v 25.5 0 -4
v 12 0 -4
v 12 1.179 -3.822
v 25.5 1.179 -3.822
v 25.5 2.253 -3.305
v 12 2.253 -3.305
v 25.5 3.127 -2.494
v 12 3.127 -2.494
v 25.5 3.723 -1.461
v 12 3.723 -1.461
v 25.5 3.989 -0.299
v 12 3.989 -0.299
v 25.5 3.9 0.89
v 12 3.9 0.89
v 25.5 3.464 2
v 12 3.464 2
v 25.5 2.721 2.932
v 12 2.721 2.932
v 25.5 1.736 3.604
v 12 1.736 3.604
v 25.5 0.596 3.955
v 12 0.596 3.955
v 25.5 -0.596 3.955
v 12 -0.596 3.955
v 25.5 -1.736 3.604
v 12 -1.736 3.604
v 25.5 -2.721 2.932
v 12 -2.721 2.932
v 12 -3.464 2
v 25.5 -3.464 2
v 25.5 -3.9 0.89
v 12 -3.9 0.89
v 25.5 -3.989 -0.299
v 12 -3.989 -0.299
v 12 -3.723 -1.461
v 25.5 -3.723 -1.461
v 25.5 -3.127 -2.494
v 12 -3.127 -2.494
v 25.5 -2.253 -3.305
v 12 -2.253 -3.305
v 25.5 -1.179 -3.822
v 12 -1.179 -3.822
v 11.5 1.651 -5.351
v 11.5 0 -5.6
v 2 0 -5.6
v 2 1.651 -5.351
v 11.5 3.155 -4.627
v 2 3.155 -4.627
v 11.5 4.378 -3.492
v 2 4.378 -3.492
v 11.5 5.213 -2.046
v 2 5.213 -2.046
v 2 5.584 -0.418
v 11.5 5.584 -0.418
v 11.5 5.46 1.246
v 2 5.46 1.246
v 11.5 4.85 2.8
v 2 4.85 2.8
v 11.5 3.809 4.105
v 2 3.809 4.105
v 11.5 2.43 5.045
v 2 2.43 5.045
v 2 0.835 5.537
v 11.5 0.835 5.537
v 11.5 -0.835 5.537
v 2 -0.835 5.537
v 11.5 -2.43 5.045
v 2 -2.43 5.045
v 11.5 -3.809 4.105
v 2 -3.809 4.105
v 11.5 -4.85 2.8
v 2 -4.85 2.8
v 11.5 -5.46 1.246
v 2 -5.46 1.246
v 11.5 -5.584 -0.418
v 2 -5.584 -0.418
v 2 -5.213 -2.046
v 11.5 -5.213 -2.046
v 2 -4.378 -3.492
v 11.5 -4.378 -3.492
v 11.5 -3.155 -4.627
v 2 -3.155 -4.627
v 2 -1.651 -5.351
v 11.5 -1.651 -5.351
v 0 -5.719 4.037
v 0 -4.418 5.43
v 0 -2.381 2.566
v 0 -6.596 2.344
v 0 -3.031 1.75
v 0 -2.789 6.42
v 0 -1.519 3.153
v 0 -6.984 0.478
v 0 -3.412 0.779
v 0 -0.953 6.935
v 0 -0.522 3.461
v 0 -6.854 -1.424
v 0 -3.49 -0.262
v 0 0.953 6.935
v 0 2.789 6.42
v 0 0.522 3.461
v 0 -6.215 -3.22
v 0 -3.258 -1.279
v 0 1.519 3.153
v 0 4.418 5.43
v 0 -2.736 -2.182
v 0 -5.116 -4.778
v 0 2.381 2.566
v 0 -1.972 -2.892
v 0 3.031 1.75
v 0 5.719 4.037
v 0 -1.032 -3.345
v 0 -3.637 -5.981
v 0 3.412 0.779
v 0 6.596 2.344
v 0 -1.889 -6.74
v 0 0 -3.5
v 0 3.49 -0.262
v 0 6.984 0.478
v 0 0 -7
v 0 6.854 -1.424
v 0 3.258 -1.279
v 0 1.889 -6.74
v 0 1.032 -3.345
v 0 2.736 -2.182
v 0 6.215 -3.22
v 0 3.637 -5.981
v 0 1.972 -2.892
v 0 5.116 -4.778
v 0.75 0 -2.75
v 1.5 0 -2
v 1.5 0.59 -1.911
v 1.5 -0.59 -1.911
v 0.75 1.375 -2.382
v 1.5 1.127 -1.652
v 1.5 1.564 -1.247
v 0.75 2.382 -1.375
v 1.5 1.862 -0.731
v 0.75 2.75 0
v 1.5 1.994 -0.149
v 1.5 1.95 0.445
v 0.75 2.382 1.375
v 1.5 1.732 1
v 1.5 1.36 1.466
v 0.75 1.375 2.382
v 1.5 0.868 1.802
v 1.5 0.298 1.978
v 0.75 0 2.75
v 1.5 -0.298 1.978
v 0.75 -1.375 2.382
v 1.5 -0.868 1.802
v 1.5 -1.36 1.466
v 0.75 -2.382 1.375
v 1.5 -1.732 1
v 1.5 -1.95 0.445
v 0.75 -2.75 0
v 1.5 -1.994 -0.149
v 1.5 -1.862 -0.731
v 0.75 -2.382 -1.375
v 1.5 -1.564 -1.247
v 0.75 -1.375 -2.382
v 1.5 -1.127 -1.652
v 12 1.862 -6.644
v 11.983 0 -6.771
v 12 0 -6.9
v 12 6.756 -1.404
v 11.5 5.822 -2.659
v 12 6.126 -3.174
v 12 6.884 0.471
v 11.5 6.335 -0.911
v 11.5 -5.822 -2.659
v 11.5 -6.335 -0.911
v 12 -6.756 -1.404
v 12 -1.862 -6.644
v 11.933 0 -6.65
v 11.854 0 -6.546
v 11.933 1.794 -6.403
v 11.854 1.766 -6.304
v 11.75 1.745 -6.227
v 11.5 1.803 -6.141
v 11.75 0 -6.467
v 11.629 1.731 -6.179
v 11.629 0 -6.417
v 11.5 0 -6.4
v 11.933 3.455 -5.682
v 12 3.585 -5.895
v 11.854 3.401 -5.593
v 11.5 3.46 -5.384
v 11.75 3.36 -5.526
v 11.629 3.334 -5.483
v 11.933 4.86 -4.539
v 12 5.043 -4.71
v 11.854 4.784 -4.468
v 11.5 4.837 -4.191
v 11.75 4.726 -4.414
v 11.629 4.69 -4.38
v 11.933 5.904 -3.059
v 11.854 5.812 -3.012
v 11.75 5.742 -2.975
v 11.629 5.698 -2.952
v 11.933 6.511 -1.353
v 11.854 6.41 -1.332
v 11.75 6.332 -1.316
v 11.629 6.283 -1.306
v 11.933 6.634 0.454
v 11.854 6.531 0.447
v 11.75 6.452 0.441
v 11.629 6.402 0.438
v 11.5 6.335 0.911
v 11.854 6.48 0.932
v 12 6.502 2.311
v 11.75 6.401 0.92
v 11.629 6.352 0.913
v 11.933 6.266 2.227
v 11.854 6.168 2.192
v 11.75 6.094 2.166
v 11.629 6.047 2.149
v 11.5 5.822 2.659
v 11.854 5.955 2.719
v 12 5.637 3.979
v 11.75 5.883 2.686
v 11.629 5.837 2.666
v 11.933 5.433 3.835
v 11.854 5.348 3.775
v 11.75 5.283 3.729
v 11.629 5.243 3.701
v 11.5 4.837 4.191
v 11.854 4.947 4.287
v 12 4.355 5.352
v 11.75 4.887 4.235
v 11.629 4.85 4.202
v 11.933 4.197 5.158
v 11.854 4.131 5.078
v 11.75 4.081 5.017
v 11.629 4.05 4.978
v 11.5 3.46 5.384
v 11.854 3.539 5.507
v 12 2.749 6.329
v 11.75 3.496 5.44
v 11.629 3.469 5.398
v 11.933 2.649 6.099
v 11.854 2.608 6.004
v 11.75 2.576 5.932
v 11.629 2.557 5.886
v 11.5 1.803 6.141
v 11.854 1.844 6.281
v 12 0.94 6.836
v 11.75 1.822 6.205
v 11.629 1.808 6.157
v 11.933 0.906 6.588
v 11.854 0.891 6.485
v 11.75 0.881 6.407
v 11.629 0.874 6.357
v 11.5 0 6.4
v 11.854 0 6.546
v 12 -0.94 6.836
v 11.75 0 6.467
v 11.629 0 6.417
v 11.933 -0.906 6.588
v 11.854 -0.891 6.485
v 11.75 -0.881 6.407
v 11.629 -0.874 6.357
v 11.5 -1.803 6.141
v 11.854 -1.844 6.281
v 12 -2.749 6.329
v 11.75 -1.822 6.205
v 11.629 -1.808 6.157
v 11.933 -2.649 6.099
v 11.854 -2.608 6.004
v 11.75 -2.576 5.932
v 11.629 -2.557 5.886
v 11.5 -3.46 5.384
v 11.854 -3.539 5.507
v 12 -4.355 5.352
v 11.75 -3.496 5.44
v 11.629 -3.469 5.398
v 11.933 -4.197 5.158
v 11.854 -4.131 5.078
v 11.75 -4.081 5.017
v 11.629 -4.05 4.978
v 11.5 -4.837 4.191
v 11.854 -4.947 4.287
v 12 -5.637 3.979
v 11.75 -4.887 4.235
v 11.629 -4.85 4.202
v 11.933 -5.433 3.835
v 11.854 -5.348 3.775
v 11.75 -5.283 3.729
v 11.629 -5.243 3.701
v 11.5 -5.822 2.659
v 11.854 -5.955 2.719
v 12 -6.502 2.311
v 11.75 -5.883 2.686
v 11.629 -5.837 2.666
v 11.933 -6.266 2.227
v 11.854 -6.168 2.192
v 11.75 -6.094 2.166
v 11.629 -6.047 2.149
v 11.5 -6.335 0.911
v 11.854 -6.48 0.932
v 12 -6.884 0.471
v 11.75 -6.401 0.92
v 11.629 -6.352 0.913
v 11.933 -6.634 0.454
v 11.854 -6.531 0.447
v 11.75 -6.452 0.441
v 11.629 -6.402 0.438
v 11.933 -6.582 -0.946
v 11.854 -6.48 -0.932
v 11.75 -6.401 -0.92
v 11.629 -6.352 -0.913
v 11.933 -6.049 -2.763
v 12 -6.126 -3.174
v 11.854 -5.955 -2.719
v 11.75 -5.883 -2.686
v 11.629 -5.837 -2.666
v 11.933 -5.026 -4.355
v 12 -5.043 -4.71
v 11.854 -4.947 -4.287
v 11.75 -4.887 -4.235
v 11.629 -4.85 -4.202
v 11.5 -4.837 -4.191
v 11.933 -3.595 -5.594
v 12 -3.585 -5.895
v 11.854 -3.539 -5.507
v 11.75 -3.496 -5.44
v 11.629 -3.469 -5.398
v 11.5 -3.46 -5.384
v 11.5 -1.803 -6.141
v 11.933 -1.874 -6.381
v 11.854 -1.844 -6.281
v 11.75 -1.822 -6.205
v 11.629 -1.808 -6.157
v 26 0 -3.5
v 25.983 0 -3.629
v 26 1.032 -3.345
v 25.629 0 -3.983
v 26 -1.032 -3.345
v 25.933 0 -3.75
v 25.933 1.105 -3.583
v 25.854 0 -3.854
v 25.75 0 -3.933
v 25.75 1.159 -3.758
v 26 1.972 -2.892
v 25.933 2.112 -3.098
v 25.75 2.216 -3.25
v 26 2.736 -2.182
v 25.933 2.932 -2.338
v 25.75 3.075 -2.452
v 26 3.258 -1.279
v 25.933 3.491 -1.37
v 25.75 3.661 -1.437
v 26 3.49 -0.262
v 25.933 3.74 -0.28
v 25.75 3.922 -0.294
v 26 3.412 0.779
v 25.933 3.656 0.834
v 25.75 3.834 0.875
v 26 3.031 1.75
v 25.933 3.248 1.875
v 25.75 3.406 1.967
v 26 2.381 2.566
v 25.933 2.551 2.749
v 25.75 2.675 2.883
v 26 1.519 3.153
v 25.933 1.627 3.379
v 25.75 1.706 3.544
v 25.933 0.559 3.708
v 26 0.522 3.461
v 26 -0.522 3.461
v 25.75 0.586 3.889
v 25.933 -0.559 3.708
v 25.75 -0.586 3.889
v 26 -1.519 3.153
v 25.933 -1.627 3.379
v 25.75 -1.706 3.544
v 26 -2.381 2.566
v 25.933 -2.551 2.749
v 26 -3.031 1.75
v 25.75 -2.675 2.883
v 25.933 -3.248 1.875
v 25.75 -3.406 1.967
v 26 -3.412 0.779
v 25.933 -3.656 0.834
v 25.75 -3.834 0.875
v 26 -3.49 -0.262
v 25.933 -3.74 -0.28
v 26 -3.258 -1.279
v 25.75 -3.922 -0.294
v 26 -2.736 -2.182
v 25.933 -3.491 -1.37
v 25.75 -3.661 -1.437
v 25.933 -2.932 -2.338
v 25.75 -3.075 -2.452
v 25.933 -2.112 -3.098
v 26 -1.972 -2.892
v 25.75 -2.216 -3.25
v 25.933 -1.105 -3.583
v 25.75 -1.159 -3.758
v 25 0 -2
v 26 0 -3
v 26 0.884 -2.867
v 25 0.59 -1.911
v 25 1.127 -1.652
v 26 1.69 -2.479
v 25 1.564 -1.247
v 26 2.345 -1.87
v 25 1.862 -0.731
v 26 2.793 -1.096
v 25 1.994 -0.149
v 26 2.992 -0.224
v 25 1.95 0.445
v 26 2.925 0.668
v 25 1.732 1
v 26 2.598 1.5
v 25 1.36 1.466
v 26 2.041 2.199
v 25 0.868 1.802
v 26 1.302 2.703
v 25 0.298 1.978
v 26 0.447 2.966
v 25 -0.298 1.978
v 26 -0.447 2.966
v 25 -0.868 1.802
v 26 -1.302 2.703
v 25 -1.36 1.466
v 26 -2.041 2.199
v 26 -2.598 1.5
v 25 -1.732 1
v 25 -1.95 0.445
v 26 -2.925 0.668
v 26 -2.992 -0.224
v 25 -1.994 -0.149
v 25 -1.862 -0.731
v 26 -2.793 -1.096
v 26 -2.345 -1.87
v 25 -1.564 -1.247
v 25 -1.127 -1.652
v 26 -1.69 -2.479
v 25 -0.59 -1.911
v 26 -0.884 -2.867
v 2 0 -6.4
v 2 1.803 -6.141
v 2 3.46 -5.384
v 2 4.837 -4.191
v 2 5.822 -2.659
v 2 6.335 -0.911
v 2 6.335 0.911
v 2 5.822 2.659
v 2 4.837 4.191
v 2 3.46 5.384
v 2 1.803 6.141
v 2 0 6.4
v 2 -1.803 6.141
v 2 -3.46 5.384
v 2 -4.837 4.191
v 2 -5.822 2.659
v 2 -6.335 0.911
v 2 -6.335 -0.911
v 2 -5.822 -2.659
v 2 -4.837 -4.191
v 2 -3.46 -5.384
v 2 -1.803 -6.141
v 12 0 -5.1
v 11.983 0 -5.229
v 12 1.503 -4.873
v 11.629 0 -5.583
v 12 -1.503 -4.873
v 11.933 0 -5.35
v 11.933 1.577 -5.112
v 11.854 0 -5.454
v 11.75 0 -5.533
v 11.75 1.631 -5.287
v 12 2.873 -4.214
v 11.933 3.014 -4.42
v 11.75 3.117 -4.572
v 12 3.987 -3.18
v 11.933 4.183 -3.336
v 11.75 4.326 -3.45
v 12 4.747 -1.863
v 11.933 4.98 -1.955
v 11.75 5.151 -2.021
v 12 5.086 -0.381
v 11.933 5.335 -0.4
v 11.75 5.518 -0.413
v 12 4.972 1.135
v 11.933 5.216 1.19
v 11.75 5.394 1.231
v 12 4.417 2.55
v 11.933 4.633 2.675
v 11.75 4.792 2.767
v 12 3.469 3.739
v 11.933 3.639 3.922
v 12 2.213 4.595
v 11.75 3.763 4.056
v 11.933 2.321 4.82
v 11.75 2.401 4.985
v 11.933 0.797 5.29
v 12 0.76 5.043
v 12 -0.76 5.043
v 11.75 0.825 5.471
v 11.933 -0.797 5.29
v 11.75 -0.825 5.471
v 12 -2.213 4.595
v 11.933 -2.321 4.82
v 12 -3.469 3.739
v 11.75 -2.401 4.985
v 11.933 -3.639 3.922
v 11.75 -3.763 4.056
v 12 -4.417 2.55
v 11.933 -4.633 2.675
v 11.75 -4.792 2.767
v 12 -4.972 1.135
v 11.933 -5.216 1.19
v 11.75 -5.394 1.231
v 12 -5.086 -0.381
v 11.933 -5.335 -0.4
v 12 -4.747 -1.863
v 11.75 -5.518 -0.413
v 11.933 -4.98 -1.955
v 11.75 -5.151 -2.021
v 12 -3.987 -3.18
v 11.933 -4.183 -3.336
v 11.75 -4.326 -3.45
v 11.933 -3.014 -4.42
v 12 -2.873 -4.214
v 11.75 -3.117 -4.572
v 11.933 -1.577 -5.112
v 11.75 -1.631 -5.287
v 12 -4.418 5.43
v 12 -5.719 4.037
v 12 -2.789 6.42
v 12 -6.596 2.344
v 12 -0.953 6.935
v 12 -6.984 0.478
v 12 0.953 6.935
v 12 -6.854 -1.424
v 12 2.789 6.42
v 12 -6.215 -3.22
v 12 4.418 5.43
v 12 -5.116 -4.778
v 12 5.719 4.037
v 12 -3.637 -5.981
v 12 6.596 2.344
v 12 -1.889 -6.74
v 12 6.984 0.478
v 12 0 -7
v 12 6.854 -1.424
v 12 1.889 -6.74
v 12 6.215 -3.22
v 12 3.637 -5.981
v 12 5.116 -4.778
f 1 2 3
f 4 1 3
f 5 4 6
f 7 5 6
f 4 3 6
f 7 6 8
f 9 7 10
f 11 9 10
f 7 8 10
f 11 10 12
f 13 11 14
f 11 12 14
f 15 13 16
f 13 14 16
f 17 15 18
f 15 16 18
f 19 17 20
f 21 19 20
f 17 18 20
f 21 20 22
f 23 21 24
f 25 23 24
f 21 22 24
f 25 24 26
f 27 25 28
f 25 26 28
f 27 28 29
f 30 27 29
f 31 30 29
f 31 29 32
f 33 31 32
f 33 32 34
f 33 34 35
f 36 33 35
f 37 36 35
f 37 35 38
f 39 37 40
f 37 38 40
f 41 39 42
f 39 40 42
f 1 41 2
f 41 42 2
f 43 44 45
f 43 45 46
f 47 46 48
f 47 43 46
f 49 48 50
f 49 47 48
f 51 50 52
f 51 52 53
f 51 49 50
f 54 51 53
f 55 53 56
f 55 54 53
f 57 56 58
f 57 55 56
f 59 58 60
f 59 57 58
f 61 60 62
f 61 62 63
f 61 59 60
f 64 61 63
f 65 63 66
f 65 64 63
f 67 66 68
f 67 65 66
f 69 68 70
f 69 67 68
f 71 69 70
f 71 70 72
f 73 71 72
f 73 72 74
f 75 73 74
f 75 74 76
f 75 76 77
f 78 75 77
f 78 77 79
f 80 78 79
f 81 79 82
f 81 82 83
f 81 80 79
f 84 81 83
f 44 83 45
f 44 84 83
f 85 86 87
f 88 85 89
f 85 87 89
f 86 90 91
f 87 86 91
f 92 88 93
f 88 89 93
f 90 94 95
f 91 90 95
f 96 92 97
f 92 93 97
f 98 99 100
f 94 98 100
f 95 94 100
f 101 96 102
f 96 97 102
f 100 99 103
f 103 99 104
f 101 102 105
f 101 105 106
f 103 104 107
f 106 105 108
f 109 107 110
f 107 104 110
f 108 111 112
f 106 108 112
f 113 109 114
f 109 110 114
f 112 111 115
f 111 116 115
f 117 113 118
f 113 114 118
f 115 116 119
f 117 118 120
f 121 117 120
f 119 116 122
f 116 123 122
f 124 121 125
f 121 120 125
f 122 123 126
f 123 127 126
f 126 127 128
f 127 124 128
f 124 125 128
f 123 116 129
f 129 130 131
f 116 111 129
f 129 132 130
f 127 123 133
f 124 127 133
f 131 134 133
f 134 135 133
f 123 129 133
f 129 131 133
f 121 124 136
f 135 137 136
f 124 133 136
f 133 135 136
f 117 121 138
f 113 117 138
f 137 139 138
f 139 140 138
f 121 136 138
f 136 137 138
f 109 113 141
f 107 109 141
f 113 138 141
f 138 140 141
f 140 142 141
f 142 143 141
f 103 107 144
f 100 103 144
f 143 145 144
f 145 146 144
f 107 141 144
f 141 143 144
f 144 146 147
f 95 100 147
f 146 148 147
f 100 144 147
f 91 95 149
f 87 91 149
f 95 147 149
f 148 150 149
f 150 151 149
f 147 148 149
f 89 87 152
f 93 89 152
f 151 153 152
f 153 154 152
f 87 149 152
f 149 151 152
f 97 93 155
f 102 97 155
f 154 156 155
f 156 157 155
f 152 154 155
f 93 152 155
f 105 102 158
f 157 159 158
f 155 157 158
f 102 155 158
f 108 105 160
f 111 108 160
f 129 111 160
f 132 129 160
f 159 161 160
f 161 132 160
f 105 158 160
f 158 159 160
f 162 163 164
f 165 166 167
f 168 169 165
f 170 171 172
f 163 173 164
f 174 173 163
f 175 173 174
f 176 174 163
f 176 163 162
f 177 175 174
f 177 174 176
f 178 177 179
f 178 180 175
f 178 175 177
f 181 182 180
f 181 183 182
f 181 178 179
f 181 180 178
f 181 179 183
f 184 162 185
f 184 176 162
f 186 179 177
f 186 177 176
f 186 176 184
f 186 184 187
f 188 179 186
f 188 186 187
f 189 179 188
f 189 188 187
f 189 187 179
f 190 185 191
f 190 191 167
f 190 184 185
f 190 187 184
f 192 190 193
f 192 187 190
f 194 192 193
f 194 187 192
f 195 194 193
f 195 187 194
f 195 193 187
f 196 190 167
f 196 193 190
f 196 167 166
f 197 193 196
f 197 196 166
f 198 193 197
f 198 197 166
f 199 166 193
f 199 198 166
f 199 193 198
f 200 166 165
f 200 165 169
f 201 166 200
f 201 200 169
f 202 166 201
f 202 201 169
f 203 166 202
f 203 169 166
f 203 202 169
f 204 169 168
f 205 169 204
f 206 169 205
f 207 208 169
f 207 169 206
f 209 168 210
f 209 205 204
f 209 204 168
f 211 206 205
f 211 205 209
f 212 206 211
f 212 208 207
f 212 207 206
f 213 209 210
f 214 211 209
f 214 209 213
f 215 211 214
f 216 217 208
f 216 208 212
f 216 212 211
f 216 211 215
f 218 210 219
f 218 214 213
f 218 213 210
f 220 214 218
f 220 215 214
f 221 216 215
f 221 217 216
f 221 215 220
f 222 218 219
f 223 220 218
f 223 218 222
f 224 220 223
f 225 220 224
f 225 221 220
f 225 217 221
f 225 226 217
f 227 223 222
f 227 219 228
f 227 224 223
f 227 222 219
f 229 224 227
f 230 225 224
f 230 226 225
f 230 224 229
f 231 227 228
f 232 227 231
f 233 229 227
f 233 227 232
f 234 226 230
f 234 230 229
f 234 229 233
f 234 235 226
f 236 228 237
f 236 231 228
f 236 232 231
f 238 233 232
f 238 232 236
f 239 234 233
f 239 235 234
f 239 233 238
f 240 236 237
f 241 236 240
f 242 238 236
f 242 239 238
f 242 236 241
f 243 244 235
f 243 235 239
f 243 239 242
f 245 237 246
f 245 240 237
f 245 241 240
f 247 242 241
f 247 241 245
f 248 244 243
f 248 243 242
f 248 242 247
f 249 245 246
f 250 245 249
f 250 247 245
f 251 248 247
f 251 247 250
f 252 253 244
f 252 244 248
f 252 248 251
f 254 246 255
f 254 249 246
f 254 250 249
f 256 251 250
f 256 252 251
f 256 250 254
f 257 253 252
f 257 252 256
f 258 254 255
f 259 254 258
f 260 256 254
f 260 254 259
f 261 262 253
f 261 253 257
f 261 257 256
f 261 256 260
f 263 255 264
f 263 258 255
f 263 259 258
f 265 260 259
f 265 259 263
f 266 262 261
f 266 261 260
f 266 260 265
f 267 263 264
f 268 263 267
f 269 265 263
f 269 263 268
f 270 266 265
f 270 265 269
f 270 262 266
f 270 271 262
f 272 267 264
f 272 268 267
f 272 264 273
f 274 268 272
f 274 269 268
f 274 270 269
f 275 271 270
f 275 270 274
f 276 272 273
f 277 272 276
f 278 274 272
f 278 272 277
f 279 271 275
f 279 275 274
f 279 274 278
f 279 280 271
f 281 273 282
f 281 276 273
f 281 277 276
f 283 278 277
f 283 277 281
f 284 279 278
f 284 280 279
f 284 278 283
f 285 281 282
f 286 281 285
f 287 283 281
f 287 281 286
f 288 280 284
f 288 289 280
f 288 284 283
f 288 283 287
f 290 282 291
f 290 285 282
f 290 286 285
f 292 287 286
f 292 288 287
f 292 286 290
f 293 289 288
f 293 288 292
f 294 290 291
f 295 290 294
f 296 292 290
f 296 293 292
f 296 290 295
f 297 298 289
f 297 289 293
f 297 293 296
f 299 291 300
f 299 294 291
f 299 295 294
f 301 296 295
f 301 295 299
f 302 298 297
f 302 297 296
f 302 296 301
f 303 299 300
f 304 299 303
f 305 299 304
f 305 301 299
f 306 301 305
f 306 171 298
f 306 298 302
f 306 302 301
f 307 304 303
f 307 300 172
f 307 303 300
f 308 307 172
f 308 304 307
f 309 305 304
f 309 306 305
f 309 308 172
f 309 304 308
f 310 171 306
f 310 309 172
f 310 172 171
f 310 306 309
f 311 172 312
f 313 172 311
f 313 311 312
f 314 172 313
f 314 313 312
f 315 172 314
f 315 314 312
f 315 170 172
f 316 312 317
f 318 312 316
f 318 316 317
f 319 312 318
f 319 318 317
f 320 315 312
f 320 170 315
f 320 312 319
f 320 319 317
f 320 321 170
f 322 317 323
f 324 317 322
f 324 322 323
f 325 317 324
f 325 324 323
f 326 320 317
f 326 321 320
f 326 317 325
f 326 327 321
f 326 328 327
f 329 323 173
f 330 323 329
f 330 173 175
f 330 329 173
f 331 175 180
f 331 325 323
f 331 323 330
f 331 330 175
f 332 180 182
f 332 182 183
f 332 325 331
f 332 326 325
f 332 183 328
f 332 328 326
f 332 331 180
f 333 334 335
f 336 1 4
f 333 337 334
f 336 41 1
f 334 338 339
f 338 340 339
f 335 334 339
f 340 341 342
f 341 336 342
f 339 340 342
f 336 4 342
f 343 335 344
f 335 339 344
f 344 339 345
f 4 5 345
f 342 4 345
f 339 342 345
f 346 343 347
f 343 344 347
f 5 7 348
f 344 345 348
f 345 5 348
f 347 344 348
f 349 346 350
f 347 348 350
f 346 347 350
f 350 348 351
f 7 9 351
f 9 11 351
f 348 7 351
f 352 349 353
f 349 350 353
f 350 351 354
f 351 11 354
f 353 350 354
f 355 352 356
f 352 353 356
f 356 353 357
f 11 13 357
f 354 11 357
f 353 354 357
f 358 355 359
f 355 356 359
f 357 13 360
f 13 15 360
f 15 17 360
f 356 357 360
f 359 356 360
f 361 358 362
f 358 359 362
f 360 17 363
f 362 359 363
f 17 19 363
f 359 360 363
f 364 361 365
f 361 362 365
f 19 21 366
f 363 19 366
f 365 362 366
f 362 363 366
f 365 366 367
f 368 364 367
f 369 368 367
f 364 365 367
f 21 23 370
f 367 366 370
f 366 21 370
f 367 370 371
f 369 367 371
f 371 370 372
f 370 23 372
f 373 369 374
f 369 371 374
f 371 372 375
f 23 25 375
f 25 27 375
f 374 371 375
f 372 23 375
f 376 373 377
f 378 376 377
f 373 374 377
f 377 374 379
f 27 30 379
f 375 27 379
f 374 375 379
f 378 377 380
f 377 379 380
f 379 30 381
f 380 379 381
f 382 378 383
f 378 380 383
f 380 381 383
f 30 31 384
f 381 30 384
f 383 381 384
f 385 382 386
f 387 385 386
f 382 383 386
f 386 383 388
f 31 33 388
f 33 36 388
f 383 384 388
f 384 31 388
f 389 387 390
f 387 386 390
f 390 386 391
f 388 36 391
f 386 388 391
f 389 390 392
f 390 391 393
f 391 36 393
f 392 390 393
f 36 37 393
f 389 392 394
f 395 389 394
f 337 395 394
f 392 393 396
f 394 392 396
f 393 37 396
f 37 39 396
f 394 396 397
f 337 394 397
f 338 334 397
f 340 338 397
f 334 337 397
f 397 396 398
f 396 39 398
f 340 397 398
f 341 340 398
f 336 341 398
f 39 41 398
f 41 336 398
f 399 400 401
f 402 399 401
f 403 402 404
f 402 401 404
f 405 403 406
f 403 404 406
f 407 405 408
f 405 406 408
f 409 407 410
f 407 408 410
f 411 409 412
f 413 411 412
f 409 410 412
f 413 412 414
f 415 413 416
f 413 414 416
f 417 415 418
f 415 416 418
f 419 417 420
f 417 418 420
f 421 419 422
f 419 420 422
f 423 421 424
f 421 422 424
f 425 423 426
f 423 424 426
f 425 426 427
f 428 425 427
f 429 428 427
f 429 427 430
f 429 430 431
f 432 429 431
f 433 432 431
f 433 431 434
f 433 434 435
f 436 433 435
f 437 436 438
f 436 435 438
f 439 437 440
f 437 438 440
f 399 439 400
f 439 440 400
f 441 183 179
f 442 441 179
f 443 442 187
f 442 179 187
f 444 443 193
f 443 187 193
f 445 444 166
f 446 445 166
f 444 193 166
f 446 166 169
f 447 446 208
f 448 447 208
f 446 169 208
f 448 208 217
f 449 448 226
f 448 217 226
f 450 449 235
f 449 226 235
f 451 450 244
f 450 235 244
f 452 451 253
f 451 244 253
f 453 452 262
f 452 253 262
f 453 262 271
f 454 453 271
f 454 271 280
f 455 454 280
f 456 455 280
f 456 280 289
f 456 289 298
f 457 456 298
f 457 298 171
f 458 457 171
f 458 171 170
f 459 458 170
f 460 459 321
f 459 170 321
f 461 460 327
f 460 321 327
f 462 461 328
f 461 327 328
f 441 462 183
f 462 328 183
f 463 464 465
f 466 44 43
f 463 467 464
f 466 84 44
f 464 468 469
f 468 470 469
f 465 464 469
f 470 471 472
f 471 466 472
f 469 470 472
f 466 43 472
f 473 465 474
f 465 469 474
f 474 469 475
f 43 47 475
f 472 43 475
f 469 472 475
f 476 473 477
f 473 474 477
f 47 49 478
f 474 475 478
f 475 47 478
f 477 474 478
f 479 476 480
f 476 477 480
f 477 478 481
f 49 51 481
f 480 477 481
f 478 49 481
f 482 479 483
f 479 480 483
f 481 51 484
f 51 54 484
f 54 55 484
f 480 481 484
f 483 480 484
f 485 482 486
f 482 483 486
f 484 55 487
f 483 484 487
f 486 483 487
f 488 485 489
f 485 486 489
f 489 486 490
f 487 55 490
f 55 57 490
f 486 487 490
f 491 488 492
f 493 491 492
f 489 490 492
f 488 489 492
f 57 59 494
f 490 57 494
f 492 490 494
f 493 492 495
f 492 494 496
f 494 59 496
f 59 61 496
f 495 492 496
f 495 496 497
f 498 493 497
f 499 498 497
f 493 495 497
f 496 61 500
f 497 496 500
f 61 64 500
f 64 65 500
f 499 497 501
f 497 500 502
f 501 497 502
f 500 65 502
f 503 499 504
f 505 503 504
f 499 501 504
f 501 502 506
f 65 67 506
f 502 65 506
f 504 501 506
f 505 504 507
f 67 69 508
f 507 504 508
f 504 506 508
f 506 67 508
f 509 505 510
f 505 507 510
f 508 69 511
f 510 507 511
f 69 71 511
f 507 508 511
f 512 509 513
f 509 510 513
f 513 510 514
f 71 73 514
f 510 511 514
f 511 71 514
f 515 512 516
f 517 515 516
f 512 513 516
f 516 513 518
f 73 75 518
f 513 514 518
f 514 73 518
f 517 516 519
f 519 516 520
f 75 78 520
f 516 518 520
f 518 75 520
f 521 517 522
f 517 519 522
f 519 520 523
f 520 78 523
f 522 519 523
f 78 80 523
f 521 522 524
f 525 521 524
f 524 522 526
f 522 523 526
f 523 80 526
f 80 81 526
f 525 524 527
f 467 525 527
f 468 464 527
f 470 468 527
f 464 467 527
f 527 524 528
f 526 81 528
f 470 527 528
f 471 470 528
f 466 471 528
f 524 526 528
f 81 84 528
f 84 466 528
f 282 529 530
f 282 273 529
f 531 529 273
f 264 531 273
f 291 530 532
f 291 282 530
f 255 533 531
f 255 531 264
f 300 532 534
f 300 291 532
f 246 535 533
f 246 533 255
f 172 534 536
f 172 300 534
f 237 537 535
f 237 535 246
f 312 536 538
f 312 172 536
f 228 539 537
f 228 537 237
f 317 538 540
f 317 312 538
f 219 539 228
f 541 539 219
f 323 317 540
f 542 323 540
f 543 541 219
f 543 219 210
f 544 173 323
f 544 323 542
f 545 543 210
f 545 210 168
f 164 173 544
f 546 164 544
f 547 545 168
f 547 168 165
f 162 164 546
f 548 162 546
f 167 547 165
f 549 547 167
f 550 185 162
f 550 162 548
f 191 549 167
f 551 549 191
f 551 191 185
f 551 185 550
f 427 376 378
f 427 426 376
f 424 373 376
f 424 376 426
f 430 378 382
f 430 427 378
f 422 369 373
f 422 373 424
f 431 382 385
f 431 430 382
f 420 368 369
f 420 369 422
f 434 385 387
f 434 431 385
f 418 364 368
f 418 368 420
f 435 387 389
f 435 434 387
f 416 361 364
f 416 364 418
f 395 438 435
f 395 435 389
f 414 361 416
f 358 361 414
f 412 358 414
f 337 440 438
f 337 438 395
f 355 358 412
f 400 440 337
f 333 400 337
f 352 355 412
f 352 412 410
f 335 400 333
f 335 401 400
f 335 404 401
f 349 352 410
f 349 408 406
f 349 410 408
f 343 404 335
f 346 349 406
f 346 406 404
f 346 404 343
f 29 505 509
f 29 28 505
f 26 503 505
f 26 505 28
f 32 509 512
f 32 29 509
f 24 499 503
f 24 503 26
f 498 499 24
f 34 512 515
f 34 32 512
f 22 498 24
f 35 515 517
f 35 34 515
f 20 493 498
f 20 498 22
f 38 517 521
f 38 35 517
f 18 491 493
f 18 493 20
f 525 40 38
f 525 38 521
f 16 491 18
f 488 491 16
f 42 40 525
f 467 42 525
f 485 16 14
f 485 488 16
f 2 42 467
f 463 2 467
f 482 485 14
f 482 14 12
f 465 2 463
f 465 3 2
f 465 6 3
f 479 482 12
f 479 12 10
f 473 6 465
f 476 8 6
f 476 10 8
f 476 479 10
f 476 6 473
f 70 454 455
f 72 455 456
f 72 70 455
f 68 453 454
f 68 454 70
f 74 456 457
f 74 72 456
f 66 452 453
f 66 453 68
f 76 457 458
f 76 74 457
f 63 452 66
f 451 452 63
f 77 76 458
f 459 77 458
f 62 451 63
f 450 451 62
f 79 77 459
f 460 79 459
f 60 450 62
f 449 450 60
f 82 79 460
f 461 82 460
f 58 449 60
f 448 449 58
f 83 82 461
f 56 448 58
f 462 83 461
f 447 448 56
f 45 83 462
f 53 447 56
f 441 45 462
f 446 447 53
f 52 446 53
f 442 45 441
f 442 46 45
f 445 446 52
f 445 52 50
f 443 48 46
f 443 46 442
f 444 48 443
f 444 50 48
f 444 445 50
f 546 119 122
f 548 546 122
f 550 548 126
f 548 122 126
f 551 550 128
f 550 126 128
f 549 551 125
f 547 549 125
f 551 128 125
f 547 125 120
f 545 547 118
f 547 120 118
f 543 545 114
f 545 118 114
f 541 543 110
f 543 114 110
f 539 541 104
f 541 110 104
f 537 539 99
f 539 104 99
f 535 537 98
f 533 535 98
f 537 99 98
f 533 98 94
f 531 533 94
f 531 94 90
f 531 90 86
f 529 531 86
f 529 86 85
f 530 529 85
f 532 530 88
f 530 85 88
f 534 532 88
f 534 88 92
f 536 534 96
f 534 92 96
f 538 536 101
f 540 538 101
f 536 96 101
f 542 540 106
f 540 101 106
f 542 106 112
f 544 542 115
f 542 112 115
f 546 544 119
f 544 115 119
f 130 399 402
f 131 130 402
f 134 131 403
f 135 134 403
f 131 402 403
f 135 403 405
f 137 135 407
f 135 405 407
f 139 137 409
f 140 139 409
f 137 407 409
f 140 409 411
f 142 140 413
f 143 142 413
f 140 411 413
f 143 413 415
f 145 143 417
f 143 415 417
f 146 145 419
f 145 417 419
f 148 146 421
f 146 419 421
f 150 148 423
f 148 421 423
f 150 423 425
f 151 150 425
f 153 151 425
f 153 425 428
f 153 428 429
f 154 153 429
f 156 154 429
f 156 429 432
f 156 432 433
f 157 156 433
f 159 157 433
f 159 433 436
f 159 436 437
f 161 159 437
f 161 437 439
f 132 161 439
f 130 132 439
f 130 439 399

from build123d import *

# Parameters (mm, degrees)
SKETCH_1_R          = 7
EXTRUDE_1_DEPTH     = 12
SKETCH_2_R          = 6.4
SKETCH_2_R_2        = 5.6
CUT_EXTRUDE_1_DEPTH = 10
SKETCH_3_R          = 4
EXTRUDE_2_DEPTH     = 14
SKETCH_4_R          = 2
CUT_EXTRUDE_2_DEPTH = 28.820855486
CHAMFER_1_SIZE      = 1.5
CHAMFER_2_SIZE      = 1
FILLET_1_R          = 0.5


with BuildPart() as part:
    # 草图1 → 凸台-拉伸1 (new body)
    with BuildSketch(Plane(origin=(0, 0, 0), x_dir=(0, 0, -1), z_dir=(1, 0, 0))):
        Circle(SKETCH_1_R)
    extrude(amount=EXTRUDE_1_DEPTH)

    # 草图2 → 切除-拉伸1 (cut)
    with BuildSketch(Plane(origin=(12, 0, 0), x_dir=(0, 0, -1), z_dir=(1, 0, 0))):
        Circle(SKETCH_2_R)
        Circle(SKETCH_2_R_2, mode=Mode.SUBTRACT)
    extrude(amount=-CUT_EXTRUDE_1_DEPTH, mode=Mode.SUBTRACT)

    # 草图3 → 凸台-拉伸2 (add)
    with BuildSketch(Plane(origin=(12, 0, 0), x_dir=(0, 0, -1), z_dir=(1, 0, 0))):
        Circle(SKETCH_3_R)
    extrude(amount=EXTRUDE_2_DEPTH)

    # 草图4 → 切除-拉伸2 (cut, through all)
    with BuildSketch(Plane(origin=(26, 0, 0), x_dir=(0, 0, -1), z_dir=(1, 0, 0))):
        Circle(SKETCH_4_R)
    extrude(amount=-CUT_EXTRUDE_2_DEPTH, mode=Mode.SUBTRACT)

    # 倒角1
    chamfer_1_edges = [part.edges().sort_by_distance(p)[0] for p in [
        (0, 0, 2),
    ]]
    chamfer(chamfer_1_edges, length=CHAMFER_1_SIZE)

    # 倒角2
    chamfer_2_edges = [part.edges().sort_by_distance(p)[0] for p in [
        (26, 0, 2),
    ]]
    chamfer(chamfer_2_edges, length=CHAMFER_2_SIZE)

    # 圆角1
    fillet_1_edges = [part.edges().sort_by_distance(p)[0] for p in [
        (26, 0, 4),
        (12, 0, 5.6),
        (12, 0, 6.4),
    ]]
    fillet(fillet_1_edges, radius=FILLET_1_R)


solid = part.part
